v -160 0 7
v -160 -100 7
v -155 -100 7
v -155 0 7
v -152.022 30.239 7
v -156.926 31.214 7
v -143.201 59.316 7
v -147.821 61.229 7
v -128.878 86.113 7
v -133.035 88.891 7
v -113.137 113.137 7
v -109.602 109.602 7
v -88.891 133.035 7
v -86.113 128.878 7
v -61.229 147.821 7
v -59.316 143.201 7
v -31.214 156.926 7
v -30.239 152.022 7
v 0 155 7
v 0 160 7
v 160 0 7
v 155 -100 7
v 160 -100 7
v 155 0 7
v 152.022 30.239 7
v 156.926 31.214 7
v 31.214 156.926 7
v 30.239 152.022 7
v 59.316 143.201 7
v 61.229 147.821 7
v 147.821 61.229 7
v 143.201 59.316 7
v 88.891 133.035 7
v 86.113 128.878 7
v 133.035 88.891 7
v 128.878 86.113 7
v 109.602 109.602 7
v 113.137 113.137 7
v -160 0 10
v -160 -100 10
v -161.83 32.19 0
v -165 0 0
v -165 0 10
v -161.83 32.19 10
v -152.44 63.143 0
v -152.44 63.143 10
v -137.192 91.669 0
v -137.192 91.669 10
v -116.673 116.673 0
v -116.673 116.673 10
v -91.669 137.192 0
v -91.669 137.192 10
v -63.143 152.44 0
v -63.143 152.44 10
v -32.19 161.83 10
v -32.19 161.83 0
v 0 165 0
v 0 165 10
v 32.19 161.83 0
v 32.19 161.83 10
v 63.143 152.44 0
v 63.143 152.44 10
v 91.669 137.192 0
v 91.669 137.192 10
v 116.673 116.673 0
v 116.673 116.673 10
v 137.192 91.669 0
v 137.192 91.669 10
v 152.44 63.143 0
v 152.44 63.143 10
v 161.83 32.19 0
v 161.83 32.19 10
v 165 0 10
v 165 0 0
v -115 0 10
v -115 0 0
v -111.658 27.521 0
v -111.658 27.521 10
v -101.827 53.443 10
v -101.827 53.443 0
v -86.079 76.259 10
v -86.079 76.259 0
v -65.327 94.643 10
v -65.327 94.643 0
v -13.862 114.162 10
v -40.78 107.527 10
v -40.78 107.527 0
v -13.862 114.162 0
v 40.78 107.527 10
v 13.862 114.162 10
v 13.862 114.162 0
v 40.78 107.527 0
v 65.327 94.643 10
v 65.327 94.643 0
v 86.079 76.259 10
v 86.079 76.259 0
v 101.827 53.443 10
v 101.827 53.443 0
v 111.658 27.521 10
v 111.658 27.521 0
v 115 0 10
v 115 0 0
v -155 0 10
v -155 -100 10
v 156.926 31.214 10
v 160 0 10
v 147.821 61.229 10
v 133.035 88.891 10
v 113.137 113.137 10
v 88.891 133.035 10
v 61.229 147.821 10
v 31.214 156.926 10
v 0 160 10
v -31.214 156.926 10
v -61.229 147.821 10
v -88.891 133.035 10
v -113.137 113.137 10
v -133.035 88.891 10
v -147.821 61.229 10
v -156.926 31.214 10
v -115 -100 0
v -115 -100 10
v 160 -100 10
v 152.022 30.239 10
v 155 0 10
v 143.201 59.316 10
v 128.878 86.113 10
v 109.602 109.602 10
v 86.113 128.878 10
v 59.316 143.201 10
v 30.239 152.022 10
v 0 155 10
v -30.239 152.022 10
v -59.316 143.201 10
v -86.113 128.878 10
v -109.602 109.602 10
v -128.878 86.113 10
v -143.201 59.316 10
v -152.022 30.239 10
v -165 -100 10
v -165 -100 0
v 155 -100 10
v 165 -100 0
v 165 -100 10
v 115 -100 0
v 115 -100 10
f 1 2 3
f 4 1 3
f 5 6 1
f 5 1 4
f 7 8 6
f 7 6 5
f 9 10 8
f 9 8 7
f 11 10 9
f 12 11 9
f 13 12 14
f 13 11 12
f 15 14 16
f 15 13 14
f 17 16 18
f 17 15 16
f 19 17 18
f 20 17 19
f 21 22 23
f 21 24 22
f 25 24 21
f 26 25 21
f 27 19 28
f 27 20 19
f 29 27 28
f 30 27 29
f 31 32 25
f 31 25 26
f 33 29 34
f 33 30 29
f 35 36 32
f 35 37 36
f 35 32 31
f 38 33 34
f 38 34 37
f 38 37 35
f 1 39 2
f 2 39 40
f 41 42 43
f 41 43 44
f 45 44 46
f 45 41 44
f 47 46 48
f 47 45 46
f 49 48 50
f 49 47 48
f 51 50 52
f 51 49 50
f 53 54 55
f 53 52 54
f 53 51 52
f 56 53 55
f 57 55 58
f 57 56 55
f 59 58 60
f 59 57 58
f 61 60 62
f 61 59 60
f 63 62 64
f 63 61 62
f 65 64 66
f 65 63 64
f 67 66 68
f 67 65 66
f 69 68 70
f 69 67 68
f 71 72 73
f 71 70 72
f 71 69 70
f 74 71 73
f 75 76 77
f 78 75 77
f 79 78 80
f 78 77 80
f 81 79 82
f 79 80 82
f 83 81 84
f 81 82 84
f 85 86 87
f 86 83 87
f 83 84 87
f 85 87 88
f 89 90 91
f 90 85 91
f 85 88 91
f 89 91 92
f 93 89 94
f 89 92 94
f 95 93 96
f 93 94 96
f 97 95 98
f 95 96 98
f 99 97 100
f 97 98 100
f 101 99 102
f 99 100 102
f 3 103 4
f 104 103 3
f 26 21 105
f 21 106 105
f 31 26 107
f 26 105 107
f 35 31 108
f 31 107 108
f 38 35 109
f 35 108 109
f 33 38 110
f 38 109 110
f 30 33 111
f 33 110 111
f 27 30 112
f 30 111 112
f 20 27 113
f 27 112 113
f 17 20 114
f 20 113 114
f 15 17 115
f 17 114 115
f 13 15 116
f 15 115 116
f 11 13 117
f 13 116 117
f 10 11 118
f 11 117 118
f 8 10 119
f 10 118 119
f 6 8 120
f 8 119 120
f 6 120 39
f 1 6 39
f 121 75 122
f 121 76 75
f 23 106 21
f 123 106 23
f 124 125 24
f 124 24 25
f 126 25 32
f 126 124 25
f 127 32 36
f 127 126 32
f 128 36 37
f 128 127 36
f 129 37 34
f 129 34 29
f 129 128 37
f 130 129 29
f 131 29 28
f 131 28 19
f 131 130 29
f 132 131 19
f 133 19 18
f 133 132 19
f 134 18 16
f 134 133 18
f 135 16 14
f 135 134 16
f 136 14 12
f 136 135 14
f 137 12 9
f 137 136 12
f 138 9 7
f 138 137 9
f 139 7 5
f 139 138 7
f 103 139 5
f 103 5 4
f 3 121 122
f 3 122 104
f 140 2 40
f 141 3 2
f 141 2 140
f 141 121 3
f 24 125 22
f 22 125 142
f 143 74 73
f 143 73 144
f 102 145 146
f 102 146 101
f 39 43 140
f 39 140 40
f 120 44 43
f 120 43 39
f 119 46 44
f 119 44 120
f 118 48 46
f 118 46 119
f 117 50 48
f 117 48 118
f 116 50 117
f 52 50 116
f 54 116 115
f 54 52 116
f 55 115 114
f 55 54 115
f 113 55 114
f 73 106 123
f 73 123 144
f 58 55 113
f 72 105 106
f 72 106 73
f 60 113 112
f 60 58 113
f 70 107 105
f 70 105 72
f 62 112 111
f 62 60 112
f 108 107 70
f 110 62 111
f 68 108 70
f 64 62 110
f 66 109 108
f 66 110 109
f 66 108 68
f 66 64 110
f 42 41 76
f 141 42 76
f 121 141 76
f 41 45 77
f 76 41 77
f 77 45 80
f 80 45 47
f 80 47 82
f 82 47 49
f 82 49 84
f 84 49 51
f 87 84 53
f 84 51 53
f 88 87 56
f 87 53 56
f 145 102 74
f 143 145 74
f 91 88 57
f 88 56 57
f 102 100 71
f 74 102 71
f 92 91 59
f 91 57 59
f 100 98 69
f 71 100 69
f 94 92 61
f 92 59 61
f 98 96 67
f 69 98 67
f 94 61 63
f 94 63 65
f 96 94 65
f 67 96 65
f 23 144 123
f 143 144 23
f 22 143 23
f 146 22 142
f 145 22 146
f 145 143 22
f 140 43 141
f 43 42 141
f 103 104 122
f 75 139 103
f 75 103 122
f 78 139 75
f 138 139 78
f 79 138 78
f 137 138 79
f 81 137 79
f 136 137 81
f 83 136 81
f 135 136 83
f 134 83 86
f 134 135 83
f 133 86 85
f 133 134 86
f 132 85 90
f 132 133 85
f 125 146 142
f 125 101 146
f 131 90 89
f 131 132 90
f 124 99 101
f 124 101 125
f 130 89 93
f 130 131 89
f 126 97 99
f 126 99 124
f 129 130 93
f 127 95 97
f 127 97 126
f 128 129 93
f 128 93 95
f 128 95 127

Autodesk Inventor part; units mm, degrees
ref_plane "YZ Plane" through (0, 0, 0) normal (1, 0, 0) x (0, 1, 0)
ref_plane "XZ Plane" through (0, 0, 0) normal (0, 1, 0) x (-1, 0, 0)
ref_plane "XY Plane" through (0, 0, 0) normal (0, 0, 1) x (1, 0, 0)
sketch "Sketch1" plane through (0, 0, 0) normal (0, 0, 1) x (1, 0, 0)
  arc A0 (165, 0) -> (-165, 0) centre (0, 0) ccw
  line L0 (-165, 0) -> (-165, -100)
  line L1 (165, 0) -> (165, -100)
  arc A1 (-165, 0) -> (165, 0) centre (0, 0) ccw construction
  arc A2 (115, 0) -> (-115, 0) centre (0, 0) ccw
  line L2 (-115, 0) -> (-115, -100)
  line L3 (-115, -100) -> (-165, -100)
  line L4 (165, -100) -> (115, -100)
  line L5 (115, -100) -> (115, 0)
  arc A3 (-115, 0) -> (115, 0) centre (0, 0) ccw construction
  dimension "d0" = 330
  dimension "d1" = 100
  dimension "d2" = 100
  dimension "d4" = 230
extrude "Extrusion1" add sketch "Sketch1" along normal blind 10
sketch "Sketch2" plane through (0, 0, 10) normal (0, 0, 1) x (1, 0, 0)
  arc A0 (160, 0) -> (-160, 0) centre (0, 0) ccw
  arc A1 (155, 0) -> (-155, 0) centre (0, 0) ccw
  line L0 (-160, 0) -> (-160, -100)
  line L1 (-165, -100) -> (-115, -100) projected
  line L2 (-155, 0) -> (-155, -100)
  line L3 (155, 0) -> (155, -100)
  line L4 (115, -100) -> (165, -100) projected
  line L5 (160, 0) -> (160, -100)
  point P0 (160, -100)
  dimension "d7" = 320
  dimension "d8" = 310
extrude "Extrusion2" cut sketch "Sketch2" against normal blind 3
properties part number "Tapa Frontar y Posterior" material "Acrylic"
